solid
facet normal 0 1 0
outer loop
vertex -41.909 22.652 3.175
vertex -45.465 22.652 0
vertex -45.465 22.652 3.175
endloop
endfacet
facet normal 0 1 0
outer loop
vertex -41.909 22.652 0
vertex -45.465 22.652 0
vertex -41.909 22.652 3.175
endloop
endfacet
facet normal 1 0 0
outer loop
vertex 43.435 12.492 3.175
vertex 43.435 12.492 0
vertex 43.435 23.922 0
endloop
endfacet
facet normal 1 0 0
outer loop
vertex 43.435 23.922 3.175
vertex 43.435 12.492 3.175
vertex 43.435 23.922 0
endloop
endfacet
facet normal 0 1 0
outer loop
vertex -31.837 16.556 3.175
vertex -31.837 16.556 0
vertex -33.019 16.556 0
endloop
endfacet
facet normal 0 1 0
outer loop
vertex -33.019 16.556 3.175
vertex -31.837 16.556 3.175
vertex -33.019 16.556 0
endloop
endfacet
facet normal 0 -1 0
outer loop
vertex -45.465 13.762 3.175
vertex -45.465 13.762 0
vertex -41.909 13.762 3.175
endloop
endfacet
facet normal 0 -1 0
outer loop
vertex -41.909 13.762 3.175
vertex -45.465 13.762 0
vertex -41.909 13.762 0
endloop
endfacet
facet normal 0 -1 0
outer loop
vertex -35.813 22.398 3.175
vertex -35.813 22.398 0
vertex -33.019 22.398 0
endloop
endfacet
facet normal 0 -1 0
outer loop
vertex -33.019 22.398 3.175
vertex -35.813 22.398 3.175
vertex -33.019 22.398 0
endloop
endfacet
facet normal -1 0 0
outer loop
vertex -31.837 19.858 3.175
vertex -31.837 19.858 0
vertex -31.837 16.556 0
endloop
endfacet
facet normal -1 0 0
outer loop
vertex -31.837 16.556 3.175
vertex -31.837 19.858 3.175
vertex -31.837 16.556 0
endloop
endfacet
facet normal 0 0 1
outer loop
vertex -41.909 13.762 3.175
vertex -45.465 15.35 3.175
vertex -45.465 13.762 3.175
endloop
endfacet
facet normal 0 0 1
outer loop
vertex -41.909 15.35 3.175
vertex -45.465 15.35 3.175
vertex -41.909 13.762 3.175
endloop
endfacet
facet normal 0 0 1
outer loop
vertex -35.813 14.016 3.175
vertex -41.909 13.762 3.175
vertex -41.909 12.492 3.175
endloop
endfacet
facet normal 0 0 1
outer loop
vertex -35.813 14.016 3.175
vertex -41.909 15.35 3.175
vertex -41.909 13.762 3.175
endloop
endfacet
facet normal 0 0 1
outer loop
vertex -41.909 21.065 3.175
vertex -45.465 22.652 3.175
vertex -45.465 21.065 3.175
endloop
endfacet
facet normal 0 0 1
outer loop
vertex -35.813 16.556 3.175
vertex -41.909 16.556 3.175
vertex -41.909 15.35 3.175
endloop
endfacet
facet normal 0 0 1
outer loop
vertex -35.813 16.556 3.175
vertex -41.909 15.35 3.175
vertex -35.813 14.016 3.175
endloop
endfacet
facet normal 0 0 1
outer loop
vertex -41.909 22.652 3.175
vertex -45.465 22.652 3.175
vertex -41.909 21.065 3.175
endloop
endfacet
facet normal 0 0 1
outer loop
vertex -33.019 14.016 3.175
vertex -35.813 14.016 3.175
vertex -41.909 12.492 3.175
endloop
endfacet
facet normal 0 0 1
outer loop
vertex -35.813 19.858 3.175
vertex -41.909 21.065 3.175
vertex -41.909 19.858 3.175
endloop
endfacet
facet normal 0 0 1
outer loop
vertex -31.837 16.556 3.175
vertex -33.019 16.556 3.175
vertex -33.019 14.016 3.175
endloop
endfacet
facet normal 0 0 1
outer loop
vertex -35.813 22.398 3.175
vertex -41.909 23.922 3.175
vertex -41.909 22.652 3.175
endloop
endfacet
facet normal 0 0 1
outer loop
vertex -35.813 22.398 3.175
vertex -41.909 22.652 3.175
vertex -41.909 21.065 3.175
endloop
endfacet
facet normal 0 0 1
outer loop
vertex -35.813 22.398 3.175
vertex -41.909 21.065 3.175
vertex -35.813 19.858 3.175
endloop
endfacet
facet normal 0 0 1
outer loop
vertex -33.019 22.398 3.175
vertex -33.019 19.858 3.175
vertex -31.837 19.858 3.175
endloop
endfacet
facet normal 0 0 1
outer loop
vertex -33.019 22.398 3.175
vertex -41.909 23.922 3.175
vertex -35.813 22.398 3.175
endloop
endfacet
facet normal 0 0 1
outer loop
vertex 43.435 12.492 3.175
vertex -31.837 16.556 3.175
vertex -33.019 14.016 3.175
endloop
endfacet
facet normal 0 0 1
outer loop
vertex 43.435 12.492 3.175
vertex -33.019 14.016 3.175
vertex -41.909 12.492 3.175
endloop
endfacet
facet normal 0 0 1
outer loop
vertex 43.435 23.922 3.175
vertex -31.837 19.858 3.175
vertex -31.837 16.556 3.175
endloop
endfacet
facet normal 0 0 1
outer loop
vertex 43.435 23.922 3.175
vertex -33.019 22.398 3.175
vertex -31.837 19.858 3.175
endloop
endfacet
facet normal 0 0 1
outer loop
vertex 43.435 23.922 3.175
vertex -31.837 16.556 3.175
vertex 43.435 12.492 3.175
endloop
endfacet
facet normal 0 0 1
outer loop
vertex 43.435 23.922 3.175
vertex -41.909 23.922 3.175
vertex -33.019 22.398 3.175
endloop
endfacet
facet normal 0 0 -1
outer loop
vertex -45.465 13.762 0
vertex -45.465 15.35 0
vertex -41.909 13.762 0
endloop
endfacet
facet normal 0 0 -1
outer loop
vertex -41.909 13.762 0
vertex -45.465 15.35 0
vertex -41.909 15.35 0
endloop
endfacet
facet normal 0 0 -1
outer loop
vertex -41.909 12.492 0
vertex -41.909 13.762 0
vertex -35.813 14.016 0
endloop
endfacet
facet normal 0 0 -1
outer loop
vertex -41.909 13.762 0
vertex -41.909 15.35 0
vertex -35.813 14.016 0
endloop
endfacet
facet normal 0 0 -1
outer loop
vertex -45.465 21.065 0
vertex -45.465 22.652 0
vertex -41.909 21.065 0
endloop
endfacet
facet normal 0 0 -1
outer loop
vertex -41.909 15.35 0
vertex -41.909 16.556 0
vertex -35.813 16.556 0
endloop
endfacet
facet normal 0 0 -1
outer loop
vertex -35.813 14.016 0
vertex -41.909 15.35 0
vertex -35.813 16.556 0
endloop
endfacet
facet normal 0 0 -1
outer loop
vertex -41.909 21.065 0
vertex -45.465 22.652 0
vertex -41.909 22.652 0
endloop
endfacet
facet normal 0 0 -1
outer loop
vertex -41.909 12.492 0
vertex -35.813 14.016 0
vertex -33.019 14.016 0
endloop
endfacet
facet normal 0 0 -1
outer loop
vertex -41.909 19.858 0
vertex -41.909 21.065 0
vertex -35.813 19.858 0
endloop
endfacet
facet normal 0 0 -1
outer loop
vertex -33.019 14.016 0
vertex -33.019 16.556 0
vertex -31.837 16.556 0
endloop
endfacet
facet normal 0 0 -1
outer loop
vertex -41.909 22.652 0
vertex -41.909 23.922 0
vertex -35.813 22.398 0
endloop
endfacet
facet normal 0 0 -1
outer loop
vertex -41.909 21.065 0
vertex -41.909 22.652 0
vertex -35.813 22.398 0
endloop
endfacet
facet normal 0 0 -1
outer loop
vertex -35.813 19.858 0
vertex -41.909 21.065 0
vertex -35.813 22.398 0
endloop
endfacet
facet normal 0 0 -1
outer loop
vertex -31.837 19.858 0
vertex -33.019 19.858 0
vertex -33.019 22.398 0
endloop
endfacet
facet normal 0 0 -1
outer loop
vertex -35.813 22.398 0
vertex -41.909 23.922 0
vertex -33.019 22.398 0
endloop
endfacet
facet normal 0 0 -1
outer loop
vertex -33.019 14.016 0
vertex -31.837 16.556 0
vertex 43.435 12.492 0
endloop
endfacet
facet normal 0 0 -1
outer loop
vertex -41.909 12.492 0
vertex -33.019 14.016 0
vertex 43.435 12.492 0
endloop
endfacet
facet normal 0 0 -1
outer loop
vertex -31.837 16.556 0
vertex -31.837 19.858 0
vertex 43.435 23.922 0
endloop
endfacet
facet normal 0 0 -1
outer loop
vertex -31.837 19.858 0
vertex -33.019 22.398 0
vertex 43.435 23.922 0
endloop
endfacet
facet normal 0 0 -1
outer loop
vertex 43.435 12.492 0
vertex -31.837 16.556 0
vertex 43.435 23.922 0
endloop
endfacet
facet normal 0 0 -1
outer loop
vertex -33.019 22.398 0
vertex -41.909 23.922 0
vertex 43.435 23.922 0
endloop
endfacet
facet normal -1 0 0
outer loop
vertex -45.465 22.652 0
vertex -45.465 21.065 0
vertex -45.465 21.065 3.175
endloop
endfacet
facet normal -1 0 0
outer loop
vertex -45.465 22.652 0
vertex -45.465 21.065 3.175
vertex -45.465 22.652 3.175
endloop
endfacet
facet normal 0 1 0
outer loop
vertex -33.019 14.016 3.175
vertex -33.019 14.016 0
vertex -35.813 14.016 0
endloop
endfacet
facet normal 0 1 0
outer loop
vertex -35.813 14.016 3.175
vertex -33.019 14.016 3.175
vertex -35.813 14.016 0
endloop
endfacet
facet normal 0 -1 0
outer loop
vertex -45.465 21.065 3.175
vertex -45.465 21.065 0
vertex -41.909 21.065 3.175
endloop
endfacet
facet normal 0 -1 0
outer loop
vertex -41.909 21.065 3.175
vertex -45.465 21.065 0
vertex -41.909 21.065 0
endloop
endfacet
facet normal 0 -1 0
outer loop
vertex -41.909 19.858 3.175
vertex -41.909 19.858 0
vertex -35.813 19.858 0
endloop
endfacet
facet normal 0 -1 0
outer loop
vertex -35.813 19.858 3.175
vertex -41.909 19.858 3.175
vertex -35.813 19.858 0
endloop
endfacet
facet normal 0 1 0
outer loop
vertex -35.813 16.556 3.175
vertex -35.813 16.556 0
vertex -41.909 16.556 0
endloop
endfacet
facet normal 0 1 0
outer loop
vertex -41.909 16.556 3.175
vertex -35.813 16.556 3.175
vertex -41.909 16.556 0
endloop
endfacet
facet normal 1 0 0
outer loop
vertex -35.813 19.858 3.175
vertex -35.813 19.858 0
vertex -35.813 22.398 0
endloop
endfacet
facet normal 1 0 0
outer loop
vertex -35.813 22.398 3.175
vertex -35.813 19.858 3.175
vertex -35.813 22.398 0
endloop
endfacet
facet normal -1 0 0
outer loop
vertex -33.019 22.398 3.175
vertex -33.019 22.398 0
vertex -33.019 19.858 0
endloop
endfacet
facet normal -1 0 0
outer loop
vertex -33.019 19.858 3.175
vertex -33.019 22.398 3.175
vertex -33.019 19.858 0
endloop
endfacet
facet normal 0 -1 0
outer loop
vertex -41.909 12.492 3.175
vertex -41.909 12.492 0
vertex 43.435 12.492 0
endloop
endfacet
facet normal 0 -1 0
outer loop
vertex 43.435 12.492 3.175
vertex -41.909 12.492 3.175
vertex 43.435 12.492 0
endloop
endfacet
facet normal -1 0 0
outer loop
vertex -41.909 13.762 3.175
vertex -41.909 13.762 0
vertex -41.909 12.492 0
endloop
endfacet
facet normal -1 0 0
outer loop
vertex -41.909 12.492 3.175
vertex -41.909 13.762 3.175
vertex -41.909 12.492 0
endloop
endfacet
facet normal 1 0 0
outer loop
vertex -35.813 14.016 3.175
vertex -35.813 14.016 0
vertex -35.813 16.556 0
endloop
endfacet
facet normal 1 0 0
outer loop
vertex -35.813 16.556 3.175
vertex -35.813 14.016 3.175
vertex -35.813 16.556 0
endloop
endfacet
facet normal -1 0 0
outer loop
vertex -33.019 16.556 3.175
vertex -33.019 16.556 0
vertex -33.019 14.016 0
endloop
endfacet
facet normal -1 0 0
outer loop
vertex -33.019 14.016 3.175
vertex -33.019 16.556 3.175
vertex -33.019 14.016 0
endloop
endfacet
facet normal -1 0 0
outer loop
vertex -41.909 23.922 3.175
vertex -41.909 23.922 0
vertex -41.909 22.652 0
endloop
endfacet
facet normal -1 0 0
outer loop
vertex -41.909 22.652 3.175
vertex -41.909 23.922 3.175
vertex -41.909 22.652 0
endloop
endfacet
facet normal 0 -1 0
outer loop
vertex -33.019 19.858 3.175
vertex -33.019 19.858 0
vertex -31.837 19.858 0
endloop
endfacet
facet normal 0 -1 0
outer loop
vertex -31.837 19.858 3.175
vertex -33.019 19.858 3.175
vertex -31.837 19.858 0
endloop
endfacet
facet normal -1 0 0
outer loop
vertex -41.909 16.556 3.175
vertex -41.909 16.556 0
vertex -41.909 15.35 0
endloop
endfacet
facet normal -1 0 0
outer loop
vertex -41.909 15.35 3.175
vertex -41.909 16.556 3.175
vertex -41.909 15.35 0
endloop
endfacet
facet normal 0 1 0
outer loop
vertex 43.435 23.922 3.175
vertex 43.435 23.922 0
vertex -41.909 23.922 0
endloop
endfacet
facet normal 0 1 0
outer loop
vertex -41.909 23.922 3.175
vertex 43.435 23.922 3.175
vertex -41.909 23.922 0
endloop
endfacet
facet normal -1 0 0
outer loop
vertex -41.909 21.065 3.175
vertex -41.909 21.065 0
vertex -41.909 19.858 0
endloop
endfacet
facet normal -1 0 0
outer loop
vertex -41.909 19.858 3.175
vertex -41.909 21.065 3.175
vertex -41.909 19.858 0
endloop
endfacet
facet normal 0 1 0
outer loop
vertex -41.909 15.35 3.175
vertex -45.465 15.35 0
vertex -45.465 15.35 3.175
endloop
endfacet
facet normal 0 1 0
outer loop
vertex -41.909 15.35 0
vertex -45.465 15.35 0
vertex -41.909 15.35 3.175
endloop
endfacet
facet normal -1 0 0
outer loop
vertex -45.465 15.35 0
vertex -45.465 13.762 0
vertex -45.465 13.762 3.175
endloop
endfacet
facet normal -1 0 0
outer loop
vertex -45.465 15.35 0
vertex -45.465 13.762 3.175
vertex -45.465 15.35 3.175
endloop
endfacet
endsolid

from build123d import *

# Parameters (mm, degrees)
F0_W     = 3.556
F0_H     = 1.5875
F1_DEPTH = 3.175


with BuildPart() as f1:
    # F0 (on Top) → F1 (new body)
    with BuildSketch(Plane.XY):
        with Locations((-43.68662, 21.858571)):
            Rectangle(F0_W, F0_H)
        with Locations((-43.68662, 14.556071)):
            Rectangle(F0_W, F0_H)
        Polygon((43.43538, 23.922321), (-41.90862, 23.922321), (-41.90862, 22.652321), (-41.90862, 21.064821), (-41.90862, 19.858321), (-35.81262, 19.858321), (-35.81262, 22.398321), (-33.01862, 22.398321), (-33.01862, 19.858321), (-31.836697, 19.858321), (-31.836697, 18.207321), (-31.836697, 16.556321), (-33.01862, 16.556321), (-33.01862, 14.016321), (-35.81262, 14.016321), (-35.81262, 16.556321), (-41.90862, 16.556321), (-41.90862, 15.349821), (-41.90862, 13.762321), (-41.90862, 12.492321), (43.43538, 12.492321), align=None)
    extrude(amount=F1_DEPTH)


solid = f1.part
